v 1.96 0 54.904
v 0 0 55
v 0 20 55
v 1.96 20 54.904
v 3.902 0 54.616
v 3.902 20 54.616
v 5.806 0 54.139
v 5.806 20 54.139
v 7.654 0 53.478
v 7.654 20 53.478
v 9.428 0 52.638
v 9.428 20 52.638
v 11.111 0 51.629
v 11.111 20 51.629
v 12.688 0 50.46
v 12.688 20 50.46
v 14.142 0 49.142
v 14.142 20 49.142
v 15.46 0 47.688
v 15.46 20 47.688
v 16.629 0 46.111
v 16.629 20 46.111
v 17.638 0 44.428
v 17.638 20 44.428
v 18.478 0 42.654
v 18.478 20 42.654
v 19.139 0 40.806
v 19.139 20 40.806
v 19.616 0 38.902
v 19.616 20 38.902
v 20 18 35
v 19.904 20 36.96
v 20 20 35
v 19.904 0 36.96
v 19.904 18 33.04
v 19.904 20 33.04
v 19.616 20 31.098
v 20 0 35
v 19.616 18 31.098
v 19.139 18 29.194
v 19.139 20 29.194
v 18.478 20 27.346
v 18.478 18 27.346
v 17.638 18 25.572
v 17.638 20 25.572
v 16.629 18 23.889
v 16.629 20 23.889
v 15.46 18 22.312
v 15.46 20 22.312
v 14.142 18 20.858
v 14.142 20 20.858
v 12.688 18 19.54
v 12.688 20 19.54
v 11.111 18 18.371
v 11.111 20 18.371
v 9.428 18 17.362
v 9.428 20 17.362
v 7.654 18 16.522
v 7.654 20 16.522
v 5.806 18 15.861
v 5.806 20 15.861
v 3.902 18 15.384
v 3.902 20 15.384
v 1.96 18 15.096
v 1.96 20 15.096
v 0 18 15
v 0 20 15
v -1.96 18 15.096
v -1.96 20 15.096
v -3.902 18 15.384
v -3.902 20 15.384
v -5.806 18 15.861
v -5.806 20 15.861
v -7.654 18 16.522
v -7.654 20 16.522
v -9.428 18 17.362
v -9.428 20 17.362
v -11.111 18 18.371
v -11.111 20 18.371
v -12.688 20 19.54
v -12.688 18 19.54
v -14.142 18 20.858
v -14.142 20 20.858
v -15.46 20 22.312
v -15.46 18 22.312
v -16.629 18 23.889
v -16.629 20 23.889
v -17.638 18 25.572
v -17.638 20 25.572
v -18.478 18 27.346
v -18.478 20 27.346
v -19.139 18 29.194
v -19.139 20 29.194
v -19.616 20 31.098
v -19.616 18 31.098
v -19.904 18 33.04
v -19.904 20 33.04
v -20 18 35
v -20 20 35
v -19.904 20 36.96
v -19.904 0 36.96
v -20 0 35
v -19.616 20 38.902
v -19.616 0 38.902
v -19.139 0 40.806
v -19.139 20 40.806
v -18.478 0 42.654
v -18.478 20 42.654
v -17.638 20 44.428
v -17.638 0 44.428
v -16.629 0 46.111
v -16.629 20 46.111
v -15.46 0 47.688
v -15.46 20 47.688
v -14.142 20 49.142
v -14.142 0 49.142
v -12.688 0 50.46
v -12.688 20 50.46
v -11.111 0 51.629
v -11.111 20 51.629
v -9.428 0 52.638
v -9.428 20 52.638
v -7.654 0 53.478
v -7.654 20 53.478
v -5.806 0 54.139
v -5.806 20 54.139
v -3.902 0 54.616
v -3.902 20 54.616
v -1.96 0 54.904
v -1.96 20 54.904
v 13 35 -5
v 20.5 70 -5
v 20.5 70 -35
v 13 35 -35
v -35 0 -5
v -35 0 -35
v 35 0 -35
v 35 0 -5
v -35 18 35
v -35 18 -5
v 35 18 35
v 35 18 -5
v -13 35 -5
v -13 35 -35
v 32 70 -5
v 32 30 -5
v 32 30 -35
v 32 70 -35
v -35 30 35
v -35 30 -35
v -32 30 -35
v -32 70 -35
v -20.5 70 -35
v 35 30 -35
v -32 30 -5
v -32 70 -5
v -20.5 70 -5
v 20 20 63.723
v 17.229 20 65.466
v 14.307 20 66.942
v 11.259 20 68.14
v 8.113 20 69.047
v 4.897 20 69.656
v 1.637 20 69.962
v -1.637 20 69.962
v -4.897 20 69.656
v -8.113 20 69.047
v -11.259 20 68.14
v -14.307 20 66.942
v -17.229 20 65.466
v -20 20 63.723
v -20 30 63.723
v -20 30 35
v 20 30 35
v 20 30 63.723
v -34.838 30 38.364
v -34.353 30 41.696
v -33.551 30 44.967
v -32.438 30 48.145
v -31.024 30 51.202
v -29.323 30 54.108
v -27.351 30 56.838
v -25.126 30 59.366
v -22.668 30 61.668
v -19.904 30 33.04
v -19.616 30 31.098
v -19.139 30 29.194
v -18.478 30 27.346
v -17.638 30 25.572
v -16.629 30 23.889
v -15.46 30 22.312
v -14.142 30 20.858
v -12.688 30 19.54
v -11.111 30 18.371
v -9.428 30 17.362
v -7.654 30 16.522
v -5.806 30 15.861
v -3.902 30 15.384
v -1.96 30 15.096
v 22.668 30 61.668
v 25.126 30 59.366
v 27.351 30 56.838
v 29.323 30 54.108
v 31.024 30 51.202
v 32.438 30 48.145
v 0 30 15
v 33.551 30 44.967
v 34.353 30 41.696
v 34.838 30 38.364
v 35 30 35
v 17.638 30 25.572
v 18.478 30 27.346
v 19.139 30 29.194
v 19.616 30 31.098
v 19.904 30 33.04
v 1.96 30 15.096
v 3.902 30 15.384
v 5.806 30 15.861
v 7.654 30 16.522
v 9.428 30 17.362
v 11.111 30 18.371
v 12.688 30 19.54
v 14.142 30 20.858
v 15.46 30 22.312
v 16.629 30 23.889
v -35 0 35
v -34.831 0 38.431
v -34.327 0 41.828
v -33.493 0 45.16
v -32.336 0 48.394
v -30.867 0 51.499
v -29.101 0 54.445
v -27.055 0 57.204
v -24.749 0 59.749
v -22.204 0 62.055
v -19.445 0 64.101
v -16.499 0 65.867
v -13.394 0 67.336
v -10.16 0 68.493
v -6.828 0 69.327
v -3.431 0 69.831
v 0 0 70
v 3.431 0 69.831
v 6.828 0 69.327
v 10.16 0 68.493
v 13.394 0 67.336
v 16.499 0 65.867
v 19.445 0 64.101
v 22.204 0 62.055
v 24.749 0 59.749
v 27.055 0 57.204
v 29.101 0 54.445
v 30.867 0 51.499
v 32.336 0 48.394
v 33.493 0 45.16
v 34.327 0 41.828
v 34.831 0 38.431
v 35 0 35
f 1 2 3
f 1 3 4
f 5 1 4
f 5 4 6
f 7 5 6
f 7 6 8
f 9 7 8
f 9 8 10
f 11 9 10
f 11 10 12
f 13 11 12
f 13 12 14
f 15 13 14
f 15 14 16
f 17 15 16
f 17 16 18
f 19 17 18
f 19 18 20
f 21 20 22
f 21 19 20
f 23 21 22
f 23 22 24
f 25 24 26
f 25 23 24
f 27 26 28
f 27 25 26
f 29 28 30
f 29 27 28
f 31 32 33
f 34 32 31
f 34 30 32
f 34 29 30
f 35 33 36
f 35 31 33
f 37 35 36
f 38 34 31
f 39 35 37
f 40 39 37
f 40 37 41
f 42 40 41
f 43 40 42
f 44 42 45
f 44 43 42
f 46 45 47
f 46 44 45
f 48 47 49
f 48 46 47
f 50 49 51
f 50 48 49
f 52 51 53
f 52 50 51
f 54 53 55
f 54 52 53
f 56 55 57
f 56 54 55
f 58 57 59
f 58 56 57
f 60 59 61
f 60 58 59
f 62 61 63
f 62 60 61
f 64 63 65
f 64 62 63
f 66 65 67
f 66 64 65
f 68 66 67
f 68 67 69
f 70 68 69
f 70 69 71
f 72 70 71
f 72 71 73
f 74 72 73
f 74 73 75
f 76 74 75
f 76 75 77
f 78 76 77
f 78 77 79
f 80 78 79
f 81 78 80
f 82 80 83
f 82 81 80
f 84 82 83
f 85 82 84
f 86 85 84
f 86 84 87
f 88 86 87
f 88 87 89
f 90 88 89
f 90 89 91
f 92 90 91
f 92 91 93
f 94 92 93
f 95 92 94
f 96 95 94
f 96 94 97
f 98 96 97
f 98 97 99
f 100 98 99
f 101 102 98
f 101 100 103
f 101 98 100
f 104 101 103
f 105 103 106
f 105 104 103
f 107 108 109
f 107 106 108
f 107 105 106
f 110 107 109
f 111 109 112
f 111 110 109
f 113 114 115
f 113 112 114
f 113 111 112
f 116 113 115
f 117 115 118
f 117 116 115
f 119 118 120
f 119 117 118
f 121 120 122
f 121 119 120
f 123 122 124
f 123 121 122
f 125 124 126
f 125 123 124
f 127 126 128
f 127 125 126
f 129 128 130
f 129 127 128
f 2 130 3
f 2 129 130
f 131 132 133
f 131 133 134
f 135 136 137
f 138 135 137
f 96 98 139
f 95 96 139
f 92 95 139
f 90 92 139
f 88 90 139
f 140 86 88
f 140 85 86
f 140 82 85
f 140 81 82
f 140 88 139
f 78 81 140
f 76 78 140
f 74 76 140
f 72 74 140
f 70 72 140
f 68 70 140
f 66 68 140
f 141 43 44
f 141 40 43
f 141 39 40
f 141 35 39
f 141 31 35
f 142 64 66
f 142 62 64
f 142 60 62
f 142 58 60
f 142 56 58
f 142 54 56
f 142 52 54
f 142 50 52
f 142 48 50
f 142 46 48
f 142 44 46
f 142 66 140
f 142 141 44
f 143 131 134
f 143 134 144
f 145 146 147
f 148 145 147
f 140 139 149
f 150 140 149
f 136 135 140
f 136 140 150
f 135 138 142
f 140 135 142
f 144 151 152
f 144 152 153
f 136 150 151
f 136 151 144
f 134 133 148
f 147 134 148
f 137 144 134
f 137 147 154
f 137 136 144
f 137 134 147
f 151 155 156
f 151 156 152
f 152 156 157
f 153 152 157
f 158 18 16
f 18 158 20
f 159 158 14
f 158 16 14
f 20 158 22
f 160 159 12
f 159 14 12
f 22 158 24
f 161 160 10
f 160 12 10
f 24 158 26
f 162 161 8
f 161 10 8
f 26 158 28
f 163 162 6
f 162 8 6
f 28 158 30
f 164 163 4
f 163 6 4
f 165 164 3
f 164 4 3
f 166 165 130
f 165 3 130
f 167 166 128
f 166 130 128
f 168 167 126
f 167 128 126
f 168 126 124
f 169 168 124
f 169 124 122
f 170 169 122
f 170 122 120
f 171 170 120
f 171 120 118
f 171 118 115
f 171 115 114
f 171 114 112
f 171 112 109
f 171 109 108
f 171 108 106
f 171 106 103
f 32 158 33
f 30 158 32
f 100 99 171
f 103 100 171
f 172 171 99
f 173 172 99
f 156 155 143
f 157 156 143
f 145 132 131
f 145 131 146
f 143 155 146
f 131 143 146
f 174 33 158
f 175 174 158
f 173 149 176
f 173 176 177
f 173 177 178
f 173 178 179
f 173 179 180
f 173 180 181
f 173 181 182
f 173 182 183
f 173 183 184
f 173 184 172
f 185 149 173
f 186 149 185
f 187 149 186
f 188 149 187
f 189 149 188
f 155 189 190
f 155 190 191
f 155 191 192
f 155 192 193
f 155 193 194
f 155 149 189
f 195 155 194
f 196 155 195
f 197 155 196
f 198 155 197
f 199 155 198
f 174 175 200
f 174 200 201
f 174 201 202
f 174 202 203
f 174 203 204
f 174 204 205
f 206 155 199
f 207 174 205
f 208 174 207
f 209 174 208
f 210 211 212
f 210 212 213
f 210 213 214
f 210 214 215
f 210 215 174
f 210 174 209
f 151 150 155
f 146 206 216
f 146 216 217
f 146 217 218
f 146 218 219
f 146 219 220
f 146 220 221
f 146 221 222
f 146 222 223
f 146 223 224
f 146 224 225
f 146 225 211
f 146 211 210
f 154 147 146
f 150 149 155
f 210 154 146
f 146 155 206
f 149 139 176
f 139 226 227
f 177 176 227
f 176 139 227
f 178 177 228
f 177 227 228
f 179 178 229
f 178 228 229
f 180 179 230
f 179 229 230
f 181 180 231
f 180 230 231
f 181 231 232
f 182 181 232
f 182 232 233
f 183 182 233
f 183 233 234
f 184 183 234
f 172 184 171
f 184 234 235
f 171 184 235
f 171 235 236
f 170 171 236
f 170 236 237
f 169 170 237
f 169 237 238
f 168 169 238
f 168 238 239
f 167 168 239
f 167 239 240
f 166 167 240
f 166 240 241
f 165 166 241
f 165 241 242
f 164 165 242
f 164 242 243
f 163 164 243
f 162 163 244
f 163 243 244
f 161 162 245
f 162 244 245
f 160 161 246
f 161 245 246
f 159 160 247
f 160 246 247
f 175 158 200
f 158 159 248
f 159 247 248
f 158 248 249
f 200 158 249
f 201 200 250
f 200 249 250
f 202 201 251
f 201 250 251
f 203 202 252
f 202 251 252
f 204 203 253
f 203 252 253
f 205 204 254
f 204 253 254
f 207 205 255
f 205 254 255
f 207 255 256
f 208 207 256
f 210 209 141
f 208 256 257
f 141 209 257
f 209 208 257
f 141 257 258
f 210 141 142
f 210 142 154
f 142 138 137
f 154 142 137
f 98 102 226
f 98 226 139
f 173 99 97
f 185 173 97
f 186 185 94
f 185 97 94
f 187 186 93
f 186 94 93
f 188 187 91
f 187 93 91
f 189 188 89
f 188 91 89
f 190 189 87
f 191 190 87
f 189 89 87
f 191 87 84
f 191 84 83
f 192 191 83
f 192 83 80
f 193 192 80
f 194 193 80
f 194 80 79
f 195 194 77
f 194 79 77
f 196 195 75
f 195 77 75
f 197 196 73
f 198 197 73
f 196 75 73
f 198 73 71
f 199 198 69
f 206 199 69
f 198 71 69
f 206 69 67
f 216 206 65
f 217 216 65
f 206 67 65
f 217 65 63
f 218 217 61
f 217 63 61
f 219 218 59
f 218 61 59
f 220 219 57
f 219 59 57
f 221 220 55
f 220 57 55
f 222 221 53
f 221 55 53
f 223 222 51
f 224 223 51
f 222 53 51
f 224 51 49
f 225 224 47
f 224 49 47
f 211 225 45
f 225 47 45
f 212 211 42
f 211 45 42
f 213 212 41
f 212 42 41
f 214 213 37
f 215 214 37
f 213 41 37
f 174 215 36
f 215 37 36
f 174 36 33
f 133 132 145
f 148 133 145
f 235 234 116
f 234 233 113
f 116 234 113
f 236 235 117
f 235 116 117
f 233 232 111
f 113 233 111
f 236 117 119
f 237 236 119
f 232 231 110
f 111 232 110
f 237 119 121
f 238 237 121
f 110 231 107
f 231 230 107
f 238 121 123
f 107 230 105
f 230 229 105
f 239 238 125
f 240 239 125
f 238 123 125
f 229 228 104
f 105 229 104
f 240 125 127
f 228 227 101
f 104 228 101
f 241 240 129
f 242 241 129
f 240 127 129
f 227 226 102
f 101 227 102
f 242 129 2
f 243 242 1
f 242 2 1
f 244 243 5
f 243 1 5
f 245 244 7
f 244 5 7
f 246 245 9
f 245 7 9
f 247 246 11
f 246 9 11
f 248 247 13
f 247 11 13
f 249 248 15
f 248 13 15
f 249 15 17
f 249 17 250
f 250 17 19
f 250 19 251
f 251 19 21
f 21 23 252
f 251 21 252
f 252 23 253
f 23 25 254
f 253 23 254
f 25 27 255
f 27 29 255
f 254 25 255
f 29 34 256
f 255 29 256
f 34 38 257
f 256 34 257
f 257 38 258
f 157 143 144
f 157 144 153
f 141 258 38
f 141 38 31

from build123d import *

# Parameters (mm, degrees)
SKETCH1_R           = 20
SKETCH1_W           = 70
SKETCH1_H           = 30
BOSS_EXTRUDE1_DEPTH = 30
SKETCH2_W           = 40
SKETCH2_H           = 18
CUT_EXTRUDE1_DEPTH  = 70
CUT_EXTRUDE2_START  = -10
CUT_EXTRUDE2_DEPTH  = 10
SKETCH4_W           = 64
SKETCH4_H           = 30
BOSS_EXTRUDE2_DEPTH = 40
CUT_EXTRUDE3_DEPTH  = 109.397416943


with BuildPart() as part:
    # Sketch1 → Boss-Extrude1 (new body)
    # profile 1 of 2: a face of its own
    with BuildSketch(Plane(origin=(0, 0, 0), x_dir=(1, 0, 0), z_dir=(0, 1, 0))):
        with BuildLine():
            Line((-35, 5), (-35, -35))
            ThreePointArc((-35, -35), (0, -70), (35, -35))
            Line((35, -35), (35, 5))
            Line((35, 5), (-35, 5))
        make_face()
        with Locations(Location((0, -35, 0), (0, 0, 270))):
            Circle(SKETCH1_R, mode=Mode.SUBTRACT)
    # profile 2 of 2: a face of its own
    with BuildSketch(Plane(origin=(0, 0, 0), x_dir=(1, 0, 0), z_dir=(0, 1, 0))):
        with Locations((0, 20)):
            Rectangle(SKETCH1_W, SKETCH1_H)
    extrude(amount=BOSS_EXTRUDE1_DEPTH)

    # Sketch2 → Cut-Extrude1 (cut)
    with BuildSketch(Plane(origin=(35, 0, 0), x_dir=(0, 0, -1), z_dir=(1, 0, 0))):
        with Locations((-15, 9)):
            Rectangle(SKETCH2_W, SKETCH2_H)
    extrude(amount=-CUT_EXTRUDE1_DEPTH, mode=Mode.SUBTRACT)

    # Sketch3 → Cut-Extrude2 (cut)
    with BuildSketch(Plane(origin=(0, 30, 0), x_dir=(1, 0, 0), z_dir=(0, 1, 0)).offset(CUT_EXTRUDE2_START)):
        with BuildLine():
            Line((20, -35), (20, -91.691085181))
            Line((20, -91.691085181), (-20, -91.691085181))
            Line((-20, -91.691085181), (-20, -35))
            ThreePointArc((-20, -35), (0, -15), (20, -35))
        make_face()
    extrude(amount=CUT_EXTRUDE2_DEPTH, mode=Mode.SUBTRACT)

    # Sketch4 → Boss-Extrude2 (add)
    with BuildSketch(Plane(origin=(0, 30, 0), x_dir=(1, 0, 0), z_dir=(0, 1, 0))):
        with Locations((0, 20)):
            Rectangle(SKETCH4_W, SKETCH4_H)
    extrude(amount=BOSS_EXTRUDE2_DEPTH)

    # Sketch5 → Cut-Extrude3 (cut, through all)
    with BuildSketch(Plane.XY.offset(-5)):
        Polygon((-20.5, 70), (20.5, 70), (13, 35), (-13, 35), align=None)
    extrude(amount=-CUT_EXTRUDE3_DEPTH, mode=Mode.SUBTRACT)


solid = part.part
